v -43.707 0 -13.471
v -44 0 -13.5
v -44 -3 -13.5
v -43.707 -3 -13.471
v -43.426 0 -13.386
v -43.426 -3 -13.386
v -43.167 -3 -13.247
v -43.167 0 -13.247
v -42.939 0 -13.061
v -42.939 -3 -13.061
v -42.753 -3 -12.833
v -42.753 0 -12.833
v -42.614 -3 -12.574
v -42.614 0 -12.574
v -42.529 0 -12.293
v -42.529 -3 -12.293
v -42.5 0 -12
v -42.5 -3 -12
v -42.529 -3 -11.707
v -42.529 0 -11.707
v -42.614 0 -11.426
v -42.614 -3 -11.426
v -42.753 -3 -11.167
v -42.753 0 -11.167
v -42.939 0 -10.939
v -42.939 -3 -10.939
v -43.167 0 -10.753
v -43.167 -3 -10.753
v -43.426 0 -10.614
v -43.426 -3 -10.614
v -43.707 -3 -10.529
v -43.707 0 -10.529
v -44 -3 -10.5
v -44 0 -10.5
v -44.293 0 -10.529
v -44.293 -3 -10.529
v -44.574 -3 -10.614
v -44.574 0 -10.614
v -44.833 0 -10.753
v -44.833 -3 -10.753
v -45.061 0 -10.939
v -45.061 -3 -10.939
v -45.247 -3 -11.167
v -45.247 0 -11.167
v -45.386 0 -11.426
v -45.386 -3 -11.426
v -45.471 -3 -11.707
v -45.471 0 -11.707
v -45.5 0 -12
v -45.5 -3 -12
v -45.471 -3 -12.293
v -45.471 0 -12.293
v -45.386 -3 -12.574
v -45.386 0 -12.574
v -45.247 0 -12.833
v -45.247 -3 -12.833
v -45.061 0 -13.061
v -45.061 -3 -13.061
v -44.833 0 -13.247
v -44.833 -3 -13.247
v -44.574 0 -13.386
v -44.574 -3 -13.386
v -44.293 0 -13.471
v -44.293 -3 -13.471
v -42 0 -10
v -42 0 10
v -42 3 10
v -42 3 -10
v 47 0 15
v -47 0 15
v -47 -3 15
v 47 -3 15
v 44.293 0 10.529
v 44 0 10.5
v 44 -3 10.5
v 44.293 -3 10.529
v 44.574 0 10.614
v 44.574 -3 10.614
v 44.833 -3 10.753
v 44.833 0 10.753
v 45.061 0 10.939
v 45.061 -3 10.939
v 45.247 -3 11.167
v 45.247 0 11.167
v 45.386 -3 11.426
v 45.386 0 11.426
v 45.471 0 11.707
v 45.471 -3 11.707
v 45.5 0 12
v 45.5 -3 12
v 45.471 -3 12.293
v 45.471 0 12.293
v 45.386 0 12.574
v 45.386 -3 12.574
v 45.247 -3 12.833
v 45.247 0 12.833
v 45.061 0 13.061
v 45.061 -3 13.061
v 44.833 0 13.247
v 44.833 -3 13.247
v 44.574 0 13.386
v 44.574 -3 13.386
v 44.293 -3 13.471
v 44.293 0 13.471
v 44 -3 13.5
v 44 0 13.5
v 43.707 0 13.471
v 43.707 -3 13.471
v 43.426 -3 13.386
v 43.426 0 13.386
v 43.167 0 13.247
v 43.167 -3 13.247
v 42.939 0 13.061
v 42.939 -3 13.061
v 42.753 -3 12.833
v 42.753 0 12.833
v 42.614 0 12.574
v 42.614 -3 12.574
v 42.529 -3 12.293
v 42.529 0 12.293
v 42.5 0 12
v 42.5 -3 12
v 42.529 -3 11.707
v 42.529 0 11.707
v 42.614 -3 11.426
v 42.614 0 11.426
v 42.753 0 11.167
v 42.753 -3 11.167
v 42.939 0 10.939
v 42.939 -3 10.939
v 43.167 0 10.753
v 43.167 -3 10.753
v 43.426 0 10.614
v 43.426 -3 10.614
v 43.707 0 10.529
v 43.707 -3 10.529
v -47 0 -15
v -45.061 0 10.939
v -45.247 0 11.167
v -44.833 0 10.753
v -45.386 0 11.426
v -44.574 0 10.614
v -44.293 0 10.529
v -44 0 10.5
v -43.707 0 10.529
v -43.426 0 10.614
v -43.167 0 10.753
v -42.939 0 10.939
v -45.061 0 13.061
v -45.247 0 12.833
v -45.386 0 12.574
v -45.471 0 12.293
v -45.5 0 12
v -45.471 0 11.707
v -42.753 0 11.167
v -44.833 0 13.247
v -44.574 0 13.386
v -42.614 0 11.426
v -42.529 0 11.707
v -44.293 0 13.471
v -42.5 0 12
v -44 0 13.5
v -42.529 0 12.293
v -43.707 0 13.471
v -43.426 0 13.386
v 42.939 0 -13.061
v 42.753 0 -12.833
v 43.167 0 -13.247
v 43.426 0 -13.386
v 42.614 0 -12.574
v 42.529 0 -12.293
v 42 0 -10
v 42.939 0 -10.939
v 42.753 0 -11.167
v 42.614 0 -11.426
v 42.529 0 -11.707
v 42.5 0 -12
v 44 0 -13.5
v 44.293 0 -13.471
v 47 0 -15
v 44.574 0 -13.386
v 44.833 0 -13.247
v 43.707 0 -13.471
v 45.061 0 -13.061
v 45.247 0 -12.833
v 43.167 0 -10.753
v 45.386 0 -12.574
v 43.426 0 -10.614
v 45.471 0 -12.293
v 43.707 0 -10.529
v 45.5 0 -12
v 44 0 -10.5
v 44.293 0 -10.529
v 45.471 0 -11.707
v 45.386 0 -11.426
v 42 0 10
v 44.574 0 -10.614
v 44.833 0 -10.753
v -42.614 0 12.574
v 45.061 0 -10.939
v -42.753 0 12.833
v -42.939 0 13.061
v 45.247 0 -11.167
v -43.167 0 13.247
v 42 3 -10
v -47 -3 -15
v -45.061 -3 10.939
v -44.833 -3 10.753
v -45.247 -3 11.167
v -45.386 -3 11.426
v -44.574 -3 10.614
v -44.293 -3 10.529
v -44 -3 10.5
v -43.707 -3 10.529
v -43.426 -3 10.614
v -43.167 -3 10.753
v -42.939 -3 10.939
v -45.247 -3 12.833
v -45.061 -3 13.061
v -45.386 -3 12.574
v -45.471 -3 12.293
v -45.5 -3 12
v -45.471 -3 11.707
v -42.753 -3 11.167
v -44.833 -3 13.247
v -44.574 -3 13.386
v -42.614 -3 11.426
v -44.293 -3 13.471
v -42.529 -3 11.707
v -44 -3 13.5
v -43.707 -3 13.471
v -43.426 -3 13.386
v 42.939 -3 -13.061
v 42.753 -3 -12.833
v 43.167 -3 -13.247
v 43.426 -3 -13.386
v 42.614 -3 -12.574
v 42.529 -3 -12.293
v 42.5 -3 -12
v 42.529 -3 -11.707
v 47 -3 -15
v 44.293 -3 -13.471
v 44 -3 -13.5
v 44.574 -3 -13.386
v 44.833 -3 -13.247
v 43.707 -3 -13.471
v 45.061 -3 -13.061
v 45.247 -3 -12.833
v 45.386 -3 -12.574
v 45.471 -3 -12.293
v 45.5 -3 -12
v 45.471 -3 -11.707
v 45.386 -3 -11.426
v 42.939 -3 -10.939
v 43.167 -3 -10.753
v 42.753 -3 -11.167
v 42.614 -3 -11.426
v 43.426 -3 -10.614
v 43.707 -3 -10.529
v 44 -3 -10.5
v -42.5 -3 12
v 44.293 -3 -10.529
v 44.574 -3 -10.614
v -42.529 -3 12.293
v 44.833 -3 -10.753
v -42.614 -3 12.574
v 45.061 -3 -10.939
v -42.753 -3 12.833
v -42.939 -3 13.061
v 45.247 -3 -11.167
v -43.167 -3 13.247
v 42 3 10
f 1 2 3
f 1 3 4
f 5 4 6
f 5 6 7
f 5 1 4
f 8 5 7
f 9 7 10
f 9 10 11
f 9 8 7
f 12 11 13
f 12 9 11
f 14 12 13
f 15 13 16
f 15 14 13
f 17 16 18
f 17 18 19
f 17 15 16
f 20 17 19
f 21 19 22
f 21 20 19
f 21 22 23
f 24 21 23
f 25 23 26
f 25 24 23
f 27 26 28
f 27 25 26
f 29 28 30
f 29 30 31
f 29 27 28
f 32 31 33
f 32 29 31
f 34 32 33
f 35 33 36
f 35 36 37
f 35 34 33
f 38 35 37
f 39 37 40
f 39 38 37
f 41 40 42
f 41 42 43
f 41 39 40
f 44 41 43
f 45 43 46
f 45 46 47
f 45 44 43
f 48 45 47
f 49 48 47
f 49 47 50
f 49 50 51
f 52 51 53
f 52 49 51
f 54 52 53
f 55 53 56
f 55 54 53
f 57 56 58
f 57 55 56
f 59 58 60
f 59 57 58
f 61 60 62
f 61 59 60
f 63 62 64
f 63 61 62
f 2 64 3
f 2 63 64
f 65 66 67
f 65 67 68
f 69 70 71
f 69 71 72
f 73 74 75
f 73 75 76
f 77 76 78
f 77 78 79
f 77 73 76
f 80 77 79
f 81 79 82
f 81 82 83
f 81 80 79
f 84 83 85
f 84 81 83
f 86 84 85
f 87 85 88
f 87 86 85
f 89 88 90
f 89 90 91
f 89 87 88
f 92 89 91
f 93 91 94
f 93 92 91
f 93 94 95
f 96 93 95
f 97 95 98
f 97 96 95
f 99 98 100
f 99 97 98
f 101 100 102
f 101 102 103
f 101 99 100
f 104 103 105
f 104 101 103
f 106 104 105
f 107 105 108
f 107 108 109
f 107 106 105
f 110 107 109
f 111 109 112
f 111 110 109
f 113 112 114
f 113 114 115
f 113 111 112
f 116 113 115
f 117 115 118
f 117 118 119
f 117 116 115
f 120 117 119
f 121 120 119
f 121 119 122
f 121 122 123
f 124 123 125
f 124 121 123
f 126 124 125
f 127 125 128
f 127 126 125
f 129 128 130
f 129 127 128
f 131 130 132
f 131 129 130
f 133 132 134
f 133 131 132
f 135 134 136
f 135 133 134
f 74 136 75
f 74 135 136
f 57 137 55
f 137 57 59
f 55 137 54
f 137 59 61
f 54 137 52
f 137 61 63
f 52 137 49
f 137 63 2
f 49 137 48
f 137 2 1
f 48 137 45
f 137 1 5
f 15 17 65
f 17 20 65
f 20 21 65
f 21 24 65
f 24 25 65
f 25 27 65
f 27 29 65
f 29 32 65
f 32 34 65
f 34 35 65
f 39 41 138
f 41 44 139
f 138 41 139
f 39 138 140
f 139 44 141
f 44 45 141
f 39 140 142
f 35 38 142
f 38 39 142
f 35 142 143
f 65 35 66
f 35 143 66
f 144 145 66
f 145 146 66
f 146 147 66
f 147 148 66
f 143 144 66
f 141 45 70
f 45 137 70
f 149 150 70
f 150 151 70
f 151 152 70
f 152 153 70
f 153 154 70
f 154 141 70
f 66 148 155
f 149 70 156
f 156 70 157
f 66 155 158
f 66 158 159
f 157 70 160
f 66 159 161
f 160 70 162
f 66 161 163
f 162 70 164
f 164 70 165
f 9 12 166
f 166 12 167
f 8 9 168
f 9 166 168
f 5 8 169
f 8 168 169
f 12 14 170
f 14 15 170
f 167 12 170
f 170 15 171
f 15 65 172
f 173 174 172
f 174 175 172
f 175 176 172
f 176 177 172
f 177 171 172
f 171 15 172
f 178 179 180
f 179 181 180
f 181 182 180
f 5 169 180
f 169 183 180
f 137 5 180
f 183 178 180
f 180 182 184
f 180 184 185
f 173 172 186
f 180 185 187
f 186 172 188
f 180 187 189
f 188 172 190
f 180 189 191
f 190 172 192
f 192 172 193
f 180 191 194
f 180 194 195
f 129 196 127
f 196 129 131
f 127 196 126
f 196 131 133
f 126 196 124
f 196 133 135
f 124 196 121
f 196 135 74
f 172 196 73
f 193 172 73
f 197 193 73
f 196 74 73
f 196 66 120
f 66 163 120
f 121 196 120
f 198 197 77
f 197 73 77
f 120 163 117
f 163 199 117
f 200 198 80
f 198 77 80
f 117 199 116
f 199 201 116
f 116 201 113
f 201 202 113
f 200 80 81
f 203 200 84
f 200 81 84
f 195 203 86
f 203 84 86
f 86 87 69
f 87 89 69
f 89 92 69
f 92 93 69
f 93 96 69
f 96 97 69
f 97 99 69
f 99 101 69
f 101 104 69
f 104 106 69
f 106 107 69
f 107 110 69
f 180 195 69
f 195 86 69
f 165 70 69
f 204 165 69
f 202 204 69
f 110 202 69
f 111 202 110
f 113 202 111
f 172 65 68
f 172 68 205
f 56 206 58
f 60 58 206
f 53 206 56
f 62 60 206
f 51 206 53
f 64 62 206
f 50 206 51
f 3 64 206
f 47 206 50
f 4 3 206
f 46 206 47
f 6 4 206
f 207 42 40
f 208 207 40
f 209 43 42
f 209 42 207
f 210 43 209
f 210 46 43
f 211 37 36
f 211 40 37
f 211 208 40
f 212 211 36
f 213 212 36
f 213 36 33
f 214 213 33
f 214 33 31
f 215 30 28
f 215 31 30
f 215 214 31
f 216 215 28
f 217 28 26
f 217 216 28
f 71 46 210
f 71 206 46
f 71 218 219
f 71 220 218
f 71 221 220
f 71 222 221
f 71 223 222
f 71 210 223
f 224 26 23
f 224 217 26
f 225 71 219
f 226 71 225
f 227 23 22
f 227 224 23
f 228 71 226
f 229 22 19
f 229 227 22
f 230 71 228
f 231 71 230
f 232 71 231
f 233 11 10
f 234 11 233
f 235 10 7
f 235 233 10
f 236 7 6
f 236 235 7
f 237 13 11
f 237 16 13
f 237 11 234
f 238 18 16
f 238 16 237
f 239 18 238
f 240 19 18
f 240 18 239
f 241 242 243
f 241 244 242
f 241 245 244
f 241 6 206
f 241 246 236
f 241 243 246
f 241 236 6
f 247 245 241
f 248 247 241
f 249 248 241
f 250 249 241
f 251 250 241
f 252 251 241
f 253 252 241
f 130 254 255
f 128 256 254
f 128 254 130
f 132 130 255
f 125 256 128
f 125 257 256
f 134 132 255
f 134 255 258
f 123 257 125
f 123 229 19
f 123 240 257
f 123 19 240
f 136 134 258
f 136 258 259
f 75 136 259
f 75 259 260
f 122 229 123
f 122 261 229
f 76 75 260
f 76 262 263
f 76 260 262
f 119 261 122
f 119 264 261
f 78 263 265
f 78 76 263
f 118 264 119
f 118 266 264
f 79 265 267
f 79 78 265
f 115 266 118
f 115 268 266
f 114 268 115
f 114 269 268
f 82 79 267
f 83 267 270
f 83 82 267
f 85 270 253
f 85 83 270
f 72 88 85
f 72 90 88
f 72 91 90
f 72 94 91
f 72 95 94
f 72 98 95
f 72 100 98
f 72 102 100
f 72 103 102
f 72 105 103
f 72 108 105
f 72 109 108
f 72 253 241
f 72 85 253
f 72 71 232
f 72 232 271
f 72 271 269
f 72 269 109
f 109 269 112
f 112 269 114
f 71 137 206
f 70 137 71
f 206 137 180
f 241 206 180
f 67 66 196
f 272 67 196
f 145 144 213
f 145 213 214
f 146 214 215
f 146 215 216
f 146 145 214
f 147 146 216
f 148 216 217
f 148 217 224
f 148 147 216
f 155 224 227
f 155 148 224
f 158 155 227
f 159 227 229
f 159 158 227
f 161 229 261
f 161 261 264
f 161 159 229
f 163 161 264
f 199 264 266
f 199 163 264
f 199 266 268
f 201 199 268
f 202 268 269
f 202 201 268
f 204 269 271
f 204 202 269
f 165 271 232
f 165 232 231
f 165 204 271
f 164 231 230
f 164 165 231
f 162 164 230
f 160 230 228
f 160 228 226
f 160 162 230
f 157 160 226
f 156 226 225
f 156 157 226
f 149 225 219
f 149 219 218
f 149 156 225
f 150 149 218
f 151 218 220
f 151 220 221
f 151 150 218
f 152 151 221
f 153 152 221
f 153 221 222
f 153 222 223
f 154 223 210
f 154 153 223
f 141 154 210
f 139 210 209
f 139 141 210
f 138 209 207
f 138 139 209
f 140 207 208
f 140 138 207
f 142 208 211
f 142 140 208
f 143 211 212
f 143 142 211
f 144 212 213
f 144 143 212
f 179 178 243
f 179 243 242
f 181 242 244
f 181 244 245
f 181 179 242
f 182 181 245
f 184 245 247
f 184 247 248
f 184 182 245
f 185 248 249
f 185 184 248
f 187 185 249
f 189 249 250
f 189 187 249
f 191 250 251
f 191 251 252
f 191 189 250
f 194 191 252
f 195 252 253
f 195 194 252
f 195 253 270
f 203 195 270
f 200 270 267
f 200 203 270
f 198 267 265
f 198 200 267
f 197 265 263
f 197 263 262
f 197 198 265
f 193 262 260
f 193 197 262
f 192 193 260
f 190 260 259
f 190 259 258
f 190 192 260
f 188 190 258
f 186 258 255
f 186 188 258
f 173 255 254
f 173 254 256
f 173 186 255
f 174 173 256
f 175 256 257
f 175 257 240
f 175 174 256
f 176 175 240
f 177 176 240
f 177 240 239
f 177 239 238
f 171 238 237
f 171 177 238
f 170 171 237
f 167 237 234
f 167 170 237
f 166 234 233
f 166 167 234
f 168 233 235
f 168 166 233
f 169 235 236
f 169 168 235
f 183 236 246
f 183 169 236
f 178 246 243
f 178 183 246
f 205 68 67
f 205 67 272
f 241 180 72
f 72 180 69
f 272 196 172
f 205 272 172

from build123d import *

# Parameters (mm, degrees)
SKETCH1_W           = 84
SKETCH1_H           = 20
BOSS_EXTRUDE1_DEPTH = 3
SKETCH2_W           = 94
SKETCH2_H           = 30
SKETCH2_R           = 1.5
BOSS_EXTRUDE2_DEPTH = 3


with BuildPart() as part:
    # Sketch1 → Boss-Extrude1 (new body)
    with BuildSketch(Plane(origin=(0, 0, 0), x_dir=(1, 0, 0), z_dir=(0, 1, 0))):
        Rectangle(SKETCH1_W, SKETCH1_H)
    extrude(amount=BOSS_EXTRUDE1_DEPTH)

    # Sketch2 → Boss-Extrude2 (add)
    with BuildSketch(Plane.XZ):
        Rectangle(SKETCH2_W, SKETCH2_H)
        with Locations(Location((-44, 12, 0), (0, 0, 270))):
            Circle(SKETCH2_R, mode=Mode.SUBTRACT)
        with Locations(Location((-44, -12, 0), (0, 0, 270))):
            Circle(SKETCH2_R, mode=Mode.SUBTRACT)
        with Locations(Location((44, 12, 0), (0, 0, 270))):
            Circle(SKETCH2_R, mode=Mode.SUBTRACT)
        with Locations(Location((44, -12, 0), (0, 0, 270))):
            Circle(SKETCH2_R, mode=Mode.SUBTRACT)
    extrude(amount=BOSS_EXTRUDE2_DEPTH)


solid = part.part
